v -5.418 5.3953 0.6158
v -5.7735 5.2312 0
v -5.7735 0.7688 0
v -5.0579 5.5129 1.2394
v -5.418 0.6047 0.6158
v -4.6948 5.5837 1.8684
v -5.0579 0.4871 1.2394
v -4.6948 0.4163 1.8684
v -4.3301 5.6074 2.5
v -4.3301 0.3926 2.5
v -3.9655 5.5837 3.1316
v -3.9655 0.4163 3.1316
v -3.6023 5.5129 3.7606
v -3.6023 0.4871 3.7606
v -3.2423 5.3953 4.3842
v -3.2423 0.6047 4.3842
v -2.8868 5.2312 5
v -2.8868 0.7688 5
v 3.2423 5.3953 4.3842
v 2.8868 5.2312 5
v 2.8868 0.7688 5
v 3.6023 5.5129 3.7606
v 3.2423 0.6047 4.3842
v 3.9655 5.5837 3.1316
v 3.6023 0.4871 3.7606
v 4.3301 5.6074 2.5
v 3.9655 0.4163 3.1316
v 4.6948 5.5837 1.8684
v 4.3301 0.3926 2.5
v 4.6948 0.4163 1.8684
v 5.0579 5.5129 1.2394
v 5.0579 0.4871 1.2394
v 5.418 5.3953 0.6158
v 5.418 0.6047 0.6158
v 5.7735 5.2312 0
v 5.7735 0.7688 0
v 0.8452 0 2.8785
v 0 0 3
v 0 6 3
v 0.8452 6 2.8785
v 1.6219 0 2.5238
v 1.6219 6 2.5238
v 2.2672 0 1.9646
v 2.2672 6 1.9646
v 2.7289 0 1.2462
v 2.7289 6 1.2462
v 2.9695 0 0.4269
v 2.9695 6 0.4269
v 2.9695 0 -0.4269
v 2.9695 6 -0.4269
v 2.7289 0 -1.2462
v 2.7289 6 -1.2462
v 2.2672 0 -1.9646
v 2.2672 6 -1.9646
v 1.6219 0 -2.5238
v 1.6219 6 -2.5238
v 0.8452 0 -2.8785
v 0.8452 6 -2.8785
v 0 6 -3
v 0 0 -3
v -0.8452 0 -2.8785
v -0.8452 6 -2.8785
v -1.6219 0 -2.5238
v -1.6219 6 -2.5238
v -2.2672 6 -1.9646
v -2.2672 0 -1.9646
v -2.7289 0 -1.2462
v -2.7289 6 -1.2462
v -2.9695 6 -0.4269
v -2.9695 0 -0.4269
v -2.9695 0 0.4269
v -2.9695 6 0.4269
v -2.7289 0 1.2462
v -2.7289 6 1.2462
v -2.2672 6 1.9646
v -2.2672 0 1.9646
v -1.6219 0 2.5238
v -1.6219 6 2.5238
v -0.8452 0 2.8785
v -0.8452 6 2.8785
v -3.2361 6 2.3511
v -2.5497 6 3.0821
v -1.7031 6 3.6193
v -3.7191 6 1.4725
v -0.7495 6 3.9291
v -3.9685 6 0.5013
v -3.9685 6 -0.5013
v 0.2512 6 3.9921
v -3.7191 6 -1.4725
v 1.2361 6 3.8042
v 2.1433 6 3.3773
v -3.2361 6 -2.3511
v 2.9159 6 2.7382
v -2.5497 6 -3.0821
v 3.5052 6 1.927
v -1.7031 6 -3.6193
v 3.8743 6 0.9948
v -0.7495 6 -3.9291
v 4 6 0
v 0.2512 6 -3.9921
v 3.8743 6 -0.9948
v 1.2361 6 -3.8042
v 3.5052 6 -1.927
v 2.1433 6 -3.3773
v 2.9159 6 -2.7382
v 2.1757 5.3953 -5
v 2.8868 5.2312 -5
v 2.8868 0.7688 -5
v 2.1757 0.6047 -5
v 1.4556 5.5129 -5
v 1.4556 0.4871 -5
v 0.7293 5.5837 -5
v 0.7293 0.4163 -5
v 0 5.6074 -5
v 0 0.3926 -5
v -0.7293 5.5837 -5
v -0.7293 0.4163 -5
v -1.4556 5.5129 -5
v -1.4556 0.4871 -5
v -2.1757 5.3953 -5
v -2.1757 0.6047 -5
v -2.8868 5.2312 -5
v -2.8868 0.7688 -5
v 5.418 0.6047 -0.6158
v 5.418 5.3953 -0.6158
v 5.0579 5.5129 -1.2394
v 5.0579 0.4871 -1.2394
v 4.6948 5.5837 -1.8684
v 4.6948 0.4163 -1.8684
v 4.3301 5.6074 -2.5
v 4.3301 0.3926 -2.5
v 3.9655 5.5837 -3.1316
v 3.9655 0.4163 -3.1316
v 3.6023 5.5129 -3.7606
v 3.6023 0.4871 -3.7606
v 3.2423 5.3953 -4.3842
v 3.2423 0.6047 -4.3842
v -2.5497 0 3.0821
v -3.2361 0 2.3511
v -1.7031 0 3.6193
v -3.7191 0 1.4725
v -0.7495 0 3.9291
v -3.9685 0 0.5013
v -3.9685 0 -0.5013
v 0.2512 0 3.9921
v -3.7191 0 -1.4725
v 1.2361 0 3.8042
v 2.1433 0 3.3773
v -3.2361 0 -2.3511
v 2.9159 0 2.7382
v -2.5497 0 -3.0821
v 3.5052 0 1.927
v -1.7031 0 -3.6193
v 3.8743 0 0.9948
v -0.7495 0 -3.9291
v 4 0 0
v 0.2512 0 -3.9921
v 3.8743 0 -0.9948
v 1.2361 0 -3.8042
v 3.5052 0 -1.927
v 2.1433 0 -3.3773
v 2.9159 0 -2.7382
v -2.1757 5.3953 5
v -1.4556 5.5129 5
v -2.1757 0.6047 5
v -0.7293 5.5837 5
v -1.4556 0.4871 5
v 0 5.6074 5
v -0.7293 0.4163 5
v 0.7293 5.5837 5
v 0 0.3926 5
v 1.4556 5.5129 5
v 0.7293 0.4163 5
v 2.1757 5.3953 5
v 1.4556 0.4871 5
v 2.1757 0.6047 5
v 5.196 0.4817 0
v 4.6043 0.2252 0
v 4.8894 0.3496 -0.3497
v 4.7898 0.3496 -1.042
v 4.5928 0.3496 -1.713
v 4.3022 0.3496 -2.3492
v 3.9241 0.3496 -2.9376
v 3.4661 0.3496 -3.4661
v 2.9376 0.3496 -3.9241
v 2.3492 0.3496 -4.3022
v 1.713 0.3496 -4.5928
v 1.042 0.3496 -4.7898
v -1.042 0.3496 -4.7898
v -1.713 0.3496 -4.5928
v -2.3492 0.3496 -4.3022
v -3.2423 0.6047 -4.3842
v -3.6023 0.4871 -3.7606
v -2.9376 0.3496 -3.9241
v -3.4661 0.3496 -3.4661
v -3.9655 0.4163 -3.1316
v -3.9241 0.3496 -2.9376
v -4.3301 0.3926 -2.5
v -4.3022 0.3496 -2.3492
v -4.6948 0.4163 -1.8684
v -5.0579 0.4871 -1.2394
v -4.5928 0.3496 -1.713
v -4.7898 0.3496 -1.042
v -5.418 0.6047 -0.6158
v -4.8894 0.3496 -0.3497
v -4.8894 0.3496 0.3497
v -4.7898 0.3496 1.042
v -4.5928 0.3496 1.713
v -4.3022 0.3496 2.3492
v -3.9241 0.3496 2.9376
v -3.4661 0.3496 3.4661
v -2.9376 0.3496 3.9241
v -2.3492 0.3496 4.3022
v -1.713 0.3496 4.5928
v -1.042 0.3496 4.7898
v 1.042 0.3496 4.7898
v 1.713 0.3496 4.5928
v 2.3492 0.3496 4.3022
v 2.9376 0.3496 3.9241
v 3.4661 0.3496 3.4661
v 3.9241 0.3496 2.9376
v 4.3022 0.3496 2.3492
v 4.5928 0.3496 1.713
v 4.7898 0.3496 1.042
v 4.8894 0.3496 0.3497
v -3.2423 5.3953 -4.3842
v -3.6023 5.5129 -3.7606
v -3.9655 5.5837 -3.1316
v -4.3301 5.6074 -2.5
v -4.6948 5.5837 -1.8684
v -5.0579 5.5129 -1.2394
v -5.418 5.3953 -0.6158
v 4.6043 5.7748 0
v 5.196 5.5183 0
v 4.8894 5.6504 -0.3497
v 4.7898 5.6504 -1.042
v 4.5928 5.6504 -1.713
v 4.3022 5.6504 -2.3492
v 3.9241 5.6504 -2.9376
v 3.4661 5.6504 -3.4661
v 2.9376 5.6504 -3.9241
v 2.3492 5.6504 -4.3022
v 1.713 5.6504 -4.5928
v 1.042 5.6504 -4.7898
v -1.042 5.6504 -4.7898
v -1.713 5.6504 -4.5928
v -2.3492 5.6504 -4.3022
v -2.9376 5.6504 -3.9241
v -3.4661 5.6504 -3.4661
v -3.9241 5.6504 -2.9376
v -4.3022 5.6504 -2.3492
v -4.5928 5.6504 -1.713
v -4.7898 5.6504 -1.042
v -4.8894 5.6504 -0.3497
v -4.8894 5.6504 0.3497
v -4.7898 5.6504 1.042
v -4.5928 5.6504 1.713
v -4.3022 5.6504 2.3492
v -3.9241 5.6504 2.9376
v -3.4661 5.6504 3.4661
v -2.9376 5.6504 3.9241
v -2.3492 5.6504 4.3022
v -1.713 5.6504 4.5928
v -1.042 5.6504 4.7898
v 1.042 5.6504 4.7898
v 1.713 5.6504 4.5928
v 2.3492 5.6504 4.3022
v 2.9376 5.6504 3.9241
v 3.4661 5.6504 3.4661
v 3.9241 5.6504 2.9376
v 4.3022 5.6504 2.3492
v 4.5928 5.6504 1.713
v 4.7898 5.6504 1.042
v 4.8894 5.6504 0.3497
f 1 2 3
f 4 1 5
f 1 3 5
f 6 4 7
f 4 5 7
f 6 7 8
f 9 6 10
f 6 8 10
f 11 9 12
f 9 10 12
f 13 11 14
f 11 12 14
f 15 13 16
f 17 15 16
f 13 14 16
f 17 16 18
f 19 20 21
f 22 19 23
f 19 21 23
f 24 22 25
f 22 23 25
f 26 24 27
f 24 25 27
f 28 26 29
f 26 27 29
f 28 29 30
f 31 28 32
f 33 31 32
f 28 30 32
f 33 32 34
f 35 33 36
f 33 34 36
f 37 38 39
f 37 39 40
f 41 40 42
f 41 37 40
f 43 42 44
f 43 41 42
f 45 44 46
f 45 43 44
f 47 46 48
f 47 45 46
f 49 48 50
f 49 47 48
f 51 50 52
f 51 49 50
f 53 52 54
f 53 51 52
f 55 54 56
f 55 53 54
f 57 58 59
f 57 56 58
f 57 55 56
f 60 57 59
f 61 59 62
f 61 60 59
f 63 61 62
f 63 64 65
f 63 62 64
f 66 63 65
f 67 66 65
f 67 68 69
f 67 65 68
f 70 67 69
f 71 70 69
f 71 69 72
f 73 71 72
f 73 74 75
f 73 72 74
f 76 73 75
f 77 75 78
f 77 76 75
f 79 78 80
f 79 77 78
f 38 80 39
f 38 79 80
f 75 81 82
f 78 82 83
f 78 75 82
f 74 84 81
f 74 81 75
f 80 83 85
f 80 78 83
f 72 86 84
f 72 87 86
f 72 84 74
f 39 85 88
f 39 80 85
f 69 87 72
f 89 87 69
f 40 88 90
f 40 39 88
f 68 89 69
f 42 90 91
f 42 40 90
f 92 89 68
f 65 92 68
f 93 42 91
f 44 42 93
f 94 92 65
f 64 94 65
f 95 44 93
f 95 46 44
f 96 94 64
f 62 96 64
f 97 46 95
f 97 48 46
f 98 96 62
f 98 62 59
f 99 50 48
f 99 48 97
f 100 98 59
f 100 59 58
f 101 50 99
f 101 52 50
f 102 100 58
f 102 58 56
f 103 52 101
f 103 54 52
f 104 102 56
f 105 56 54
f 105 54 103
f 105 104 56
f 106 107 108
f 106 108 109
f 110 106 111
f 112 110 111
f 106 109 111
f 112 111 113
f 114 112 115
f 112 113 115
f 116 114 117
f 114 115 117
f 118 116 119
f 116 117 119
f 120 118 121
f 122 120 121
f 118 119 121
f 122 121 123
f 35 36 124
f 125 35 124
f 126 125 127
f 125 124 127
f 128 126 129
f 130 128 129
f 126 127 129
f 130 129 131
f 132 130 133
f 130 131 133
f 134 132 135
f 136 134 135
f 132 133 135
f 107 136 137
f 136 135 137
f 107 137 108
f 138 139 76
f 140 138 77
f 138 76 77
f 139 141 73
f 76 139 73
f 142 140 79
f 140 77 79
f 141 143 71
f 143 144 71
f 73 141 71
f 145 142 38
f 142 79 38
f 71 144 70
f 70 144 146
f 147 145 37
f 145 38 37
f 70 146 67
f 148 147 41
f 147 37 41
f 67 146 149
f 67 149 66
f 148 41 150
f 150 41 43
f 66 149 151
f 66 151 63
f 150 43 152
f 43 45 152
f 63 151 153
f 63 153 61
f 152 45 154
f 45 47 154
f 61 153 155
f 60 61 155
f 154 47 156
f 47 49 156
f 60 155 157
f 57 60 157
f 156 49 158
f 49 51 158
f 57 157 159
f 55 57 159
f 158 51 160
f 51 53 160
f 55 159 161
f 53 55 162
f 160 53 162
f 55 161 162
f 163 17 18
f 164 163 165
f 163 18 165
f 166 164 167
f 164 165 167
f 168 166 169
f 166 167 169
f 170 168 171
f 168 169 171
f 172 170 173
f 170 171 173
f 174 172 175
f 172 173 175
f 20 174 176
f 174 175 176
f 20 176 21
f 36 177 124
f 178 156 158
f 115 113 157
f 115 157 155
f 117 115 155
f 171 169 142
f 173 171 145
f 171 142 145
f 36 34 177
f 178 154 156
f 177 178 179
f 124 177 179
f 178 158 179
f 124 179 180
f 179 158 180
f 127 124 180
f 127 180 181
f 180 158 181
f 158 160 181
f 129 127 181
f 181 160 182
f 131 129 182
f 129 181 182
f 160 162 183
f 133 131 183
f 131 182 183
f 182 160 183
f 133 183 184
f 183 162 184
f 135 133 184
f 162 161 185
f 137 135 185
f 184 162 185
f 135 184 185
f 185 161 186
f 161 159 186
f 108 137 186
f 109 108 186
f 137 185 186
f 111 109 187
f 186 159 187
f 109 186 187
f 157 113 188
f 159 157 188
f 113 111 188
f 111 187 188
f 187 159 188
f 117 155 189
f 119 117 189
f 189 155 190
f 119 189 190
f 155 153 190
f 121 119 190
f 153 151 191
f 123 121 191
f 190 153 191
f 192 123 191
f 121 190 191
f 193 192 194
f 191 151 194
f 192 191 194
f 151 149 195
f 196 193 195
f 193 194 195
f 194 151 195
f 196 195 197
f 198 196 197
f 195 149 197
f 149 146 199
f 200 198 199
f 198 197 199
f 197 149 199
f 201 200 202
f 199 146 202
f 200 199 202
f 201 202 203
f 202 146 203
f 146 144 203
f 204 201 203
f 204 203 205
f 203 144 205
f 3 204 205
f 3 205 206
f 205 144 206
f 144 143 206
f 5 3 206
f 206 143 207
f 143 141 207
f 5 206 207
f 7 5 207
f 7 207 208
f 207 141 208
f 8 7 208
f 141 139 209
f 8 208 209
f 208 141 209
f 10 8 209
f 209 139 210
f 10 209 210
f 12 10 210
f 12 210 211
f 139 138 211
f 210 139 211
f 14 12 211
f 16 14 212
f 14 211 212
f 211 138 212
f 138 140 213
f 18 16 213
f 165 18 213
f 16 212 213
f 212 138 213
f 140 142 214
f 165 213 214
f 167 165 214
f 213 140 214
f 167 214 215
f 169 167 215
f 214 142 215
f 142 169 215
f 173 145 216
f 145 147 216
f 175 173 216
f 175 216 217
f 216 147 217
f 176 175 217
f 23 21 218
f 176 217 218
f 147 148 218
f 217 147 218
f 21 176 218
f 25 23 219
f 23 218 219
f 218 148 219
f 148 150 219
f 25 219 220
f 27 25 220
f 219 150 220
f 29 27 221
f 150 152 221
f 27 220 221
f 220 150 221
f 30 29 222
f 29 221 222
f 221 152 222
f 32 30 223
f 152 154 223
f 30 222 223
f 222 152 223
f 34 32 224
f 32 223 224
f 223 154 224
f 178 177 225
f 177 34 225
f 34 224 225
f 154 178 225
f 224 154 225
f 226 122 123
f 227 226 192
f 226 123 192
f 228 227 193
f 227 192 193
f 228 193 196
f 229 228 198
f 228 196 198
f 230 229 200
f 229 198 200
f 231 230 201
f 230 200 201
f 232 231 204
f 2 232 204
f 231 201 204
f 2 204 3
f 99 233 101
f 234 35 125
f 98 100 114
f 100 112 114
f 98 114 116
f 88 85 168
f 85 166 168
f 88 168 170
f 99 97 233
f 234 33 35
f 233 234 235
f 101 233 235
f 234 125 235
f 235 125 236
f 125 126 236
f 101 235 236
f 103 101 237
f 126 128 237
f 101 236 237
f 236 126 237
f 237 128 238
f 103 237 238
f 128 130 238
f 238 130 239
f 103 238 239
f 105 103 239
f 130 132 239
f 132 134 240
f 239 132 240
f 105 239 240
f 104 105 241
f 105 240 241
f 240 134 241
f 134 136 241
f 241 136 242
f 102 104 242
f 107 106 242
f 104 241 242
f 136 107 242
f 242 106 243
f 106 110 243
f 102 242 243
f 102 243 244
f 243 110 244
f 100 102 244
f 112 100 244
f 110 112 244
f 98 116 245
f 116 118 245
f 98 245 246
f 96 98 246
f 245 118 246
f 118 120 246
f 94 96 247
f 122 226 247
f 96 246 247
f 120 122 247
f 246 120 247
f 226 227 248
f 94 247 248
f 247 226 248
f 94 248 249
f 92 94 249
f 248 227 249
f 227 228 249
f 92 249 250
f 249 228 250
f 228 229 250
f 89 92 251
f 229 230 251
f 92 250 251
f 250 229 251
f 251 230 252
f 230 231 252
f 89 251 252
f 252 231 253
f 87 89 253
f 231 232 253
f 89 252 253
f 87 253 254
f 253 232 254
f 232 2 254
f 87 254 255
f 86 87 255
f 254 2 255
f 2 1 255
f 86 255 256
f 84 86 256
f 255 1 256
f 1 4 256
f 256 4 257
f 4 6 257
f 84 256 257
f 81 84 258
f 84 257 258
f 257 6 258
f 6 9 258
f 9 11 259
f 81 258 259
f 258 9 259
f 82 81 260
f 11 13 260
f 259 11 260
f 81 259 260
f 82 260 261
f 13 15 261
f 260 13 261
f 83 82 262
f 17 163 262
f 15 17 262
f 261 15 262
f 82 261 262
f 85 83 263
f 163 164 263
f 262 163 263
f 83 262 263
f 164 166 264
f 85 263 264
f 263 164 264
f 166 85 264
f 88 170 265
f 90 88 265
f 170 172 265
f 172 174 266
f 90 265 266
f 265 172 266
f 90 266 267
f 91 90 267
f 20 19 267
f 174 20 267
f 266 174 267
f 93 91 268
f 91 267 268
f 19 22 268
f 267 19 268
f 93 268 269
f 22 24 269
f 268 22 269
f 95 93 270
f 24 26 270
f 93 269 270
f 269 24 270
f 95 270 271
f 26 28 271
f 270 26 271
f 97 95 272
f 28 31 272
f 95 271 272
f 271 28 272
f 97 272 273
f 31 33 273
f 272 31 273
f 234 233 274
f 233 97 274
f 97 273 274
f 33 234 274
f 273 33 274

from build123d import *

# Parameters (mm, degrees)
BODY_DEPTH = 6
THREAD_R   = 3
HOLE_DEPTH = 10.712534856


with BuildPart() as part:
    # profile → body (new body)
    with BuildSketch(Plane(origin=(0, 0, 0), x_dir=(1, 0, 0), z_dir=(0, 1, 0))):
        Polygon((5.773502692, 0), (2.886751346, 5), (-2.886751346, 5), (-5.773502692, 0), (-2.886751346, -5), (2.886751346, -5), align=None)
    extrude(amount=BODY_DEPTH)

    # Sketch7 → fillet 2 (revolve, cut)
    with BuildSketch(Plane.XY):
        with BuildLine():
            Line((5.773502692, 5.23120945), (5.773502692, 0.76879055))
            ThreePointArc((5.773502692, 0.76879055), (2.974697147, -0.302787414), (0, -0.667161797))
            Line((0, -0.667161797), (0, -3.492163531))
            Line((0, -3.492163531), (6.272991846, -3.492163531))
            Line((6.272991846, -3.492163531), (6.272991846, 7.504587098))
            Line((6.272991846, 7.504587098), (0, 7.504587098))
            Line((0, 7.504587098), (0, 6.667161797))
            ThreePointArc((0, 6.667161797), (2.974697147, 6.302787414), (5.773502692, 5.23120945))
        make_face()
    revolve(axis=Axis((0, 0, 0), (0, 1, 0)), mode=Mode.SUBTRACT)

    # thread (on Top Plane) → hole (cut, through all)
    with BuildSketch(Plane(origin=(0, 0, 0), x_dir=(1, 0, 0), z_dir=(0, 1, 0))):
        with Locations(Location((0, 0, 0), (0, 0, 270))):
            Circle(THREAD_R)
    extrude(amount=HOLE_DEPTH, mode=Mode.SUBTRACT)


solid = part.part
